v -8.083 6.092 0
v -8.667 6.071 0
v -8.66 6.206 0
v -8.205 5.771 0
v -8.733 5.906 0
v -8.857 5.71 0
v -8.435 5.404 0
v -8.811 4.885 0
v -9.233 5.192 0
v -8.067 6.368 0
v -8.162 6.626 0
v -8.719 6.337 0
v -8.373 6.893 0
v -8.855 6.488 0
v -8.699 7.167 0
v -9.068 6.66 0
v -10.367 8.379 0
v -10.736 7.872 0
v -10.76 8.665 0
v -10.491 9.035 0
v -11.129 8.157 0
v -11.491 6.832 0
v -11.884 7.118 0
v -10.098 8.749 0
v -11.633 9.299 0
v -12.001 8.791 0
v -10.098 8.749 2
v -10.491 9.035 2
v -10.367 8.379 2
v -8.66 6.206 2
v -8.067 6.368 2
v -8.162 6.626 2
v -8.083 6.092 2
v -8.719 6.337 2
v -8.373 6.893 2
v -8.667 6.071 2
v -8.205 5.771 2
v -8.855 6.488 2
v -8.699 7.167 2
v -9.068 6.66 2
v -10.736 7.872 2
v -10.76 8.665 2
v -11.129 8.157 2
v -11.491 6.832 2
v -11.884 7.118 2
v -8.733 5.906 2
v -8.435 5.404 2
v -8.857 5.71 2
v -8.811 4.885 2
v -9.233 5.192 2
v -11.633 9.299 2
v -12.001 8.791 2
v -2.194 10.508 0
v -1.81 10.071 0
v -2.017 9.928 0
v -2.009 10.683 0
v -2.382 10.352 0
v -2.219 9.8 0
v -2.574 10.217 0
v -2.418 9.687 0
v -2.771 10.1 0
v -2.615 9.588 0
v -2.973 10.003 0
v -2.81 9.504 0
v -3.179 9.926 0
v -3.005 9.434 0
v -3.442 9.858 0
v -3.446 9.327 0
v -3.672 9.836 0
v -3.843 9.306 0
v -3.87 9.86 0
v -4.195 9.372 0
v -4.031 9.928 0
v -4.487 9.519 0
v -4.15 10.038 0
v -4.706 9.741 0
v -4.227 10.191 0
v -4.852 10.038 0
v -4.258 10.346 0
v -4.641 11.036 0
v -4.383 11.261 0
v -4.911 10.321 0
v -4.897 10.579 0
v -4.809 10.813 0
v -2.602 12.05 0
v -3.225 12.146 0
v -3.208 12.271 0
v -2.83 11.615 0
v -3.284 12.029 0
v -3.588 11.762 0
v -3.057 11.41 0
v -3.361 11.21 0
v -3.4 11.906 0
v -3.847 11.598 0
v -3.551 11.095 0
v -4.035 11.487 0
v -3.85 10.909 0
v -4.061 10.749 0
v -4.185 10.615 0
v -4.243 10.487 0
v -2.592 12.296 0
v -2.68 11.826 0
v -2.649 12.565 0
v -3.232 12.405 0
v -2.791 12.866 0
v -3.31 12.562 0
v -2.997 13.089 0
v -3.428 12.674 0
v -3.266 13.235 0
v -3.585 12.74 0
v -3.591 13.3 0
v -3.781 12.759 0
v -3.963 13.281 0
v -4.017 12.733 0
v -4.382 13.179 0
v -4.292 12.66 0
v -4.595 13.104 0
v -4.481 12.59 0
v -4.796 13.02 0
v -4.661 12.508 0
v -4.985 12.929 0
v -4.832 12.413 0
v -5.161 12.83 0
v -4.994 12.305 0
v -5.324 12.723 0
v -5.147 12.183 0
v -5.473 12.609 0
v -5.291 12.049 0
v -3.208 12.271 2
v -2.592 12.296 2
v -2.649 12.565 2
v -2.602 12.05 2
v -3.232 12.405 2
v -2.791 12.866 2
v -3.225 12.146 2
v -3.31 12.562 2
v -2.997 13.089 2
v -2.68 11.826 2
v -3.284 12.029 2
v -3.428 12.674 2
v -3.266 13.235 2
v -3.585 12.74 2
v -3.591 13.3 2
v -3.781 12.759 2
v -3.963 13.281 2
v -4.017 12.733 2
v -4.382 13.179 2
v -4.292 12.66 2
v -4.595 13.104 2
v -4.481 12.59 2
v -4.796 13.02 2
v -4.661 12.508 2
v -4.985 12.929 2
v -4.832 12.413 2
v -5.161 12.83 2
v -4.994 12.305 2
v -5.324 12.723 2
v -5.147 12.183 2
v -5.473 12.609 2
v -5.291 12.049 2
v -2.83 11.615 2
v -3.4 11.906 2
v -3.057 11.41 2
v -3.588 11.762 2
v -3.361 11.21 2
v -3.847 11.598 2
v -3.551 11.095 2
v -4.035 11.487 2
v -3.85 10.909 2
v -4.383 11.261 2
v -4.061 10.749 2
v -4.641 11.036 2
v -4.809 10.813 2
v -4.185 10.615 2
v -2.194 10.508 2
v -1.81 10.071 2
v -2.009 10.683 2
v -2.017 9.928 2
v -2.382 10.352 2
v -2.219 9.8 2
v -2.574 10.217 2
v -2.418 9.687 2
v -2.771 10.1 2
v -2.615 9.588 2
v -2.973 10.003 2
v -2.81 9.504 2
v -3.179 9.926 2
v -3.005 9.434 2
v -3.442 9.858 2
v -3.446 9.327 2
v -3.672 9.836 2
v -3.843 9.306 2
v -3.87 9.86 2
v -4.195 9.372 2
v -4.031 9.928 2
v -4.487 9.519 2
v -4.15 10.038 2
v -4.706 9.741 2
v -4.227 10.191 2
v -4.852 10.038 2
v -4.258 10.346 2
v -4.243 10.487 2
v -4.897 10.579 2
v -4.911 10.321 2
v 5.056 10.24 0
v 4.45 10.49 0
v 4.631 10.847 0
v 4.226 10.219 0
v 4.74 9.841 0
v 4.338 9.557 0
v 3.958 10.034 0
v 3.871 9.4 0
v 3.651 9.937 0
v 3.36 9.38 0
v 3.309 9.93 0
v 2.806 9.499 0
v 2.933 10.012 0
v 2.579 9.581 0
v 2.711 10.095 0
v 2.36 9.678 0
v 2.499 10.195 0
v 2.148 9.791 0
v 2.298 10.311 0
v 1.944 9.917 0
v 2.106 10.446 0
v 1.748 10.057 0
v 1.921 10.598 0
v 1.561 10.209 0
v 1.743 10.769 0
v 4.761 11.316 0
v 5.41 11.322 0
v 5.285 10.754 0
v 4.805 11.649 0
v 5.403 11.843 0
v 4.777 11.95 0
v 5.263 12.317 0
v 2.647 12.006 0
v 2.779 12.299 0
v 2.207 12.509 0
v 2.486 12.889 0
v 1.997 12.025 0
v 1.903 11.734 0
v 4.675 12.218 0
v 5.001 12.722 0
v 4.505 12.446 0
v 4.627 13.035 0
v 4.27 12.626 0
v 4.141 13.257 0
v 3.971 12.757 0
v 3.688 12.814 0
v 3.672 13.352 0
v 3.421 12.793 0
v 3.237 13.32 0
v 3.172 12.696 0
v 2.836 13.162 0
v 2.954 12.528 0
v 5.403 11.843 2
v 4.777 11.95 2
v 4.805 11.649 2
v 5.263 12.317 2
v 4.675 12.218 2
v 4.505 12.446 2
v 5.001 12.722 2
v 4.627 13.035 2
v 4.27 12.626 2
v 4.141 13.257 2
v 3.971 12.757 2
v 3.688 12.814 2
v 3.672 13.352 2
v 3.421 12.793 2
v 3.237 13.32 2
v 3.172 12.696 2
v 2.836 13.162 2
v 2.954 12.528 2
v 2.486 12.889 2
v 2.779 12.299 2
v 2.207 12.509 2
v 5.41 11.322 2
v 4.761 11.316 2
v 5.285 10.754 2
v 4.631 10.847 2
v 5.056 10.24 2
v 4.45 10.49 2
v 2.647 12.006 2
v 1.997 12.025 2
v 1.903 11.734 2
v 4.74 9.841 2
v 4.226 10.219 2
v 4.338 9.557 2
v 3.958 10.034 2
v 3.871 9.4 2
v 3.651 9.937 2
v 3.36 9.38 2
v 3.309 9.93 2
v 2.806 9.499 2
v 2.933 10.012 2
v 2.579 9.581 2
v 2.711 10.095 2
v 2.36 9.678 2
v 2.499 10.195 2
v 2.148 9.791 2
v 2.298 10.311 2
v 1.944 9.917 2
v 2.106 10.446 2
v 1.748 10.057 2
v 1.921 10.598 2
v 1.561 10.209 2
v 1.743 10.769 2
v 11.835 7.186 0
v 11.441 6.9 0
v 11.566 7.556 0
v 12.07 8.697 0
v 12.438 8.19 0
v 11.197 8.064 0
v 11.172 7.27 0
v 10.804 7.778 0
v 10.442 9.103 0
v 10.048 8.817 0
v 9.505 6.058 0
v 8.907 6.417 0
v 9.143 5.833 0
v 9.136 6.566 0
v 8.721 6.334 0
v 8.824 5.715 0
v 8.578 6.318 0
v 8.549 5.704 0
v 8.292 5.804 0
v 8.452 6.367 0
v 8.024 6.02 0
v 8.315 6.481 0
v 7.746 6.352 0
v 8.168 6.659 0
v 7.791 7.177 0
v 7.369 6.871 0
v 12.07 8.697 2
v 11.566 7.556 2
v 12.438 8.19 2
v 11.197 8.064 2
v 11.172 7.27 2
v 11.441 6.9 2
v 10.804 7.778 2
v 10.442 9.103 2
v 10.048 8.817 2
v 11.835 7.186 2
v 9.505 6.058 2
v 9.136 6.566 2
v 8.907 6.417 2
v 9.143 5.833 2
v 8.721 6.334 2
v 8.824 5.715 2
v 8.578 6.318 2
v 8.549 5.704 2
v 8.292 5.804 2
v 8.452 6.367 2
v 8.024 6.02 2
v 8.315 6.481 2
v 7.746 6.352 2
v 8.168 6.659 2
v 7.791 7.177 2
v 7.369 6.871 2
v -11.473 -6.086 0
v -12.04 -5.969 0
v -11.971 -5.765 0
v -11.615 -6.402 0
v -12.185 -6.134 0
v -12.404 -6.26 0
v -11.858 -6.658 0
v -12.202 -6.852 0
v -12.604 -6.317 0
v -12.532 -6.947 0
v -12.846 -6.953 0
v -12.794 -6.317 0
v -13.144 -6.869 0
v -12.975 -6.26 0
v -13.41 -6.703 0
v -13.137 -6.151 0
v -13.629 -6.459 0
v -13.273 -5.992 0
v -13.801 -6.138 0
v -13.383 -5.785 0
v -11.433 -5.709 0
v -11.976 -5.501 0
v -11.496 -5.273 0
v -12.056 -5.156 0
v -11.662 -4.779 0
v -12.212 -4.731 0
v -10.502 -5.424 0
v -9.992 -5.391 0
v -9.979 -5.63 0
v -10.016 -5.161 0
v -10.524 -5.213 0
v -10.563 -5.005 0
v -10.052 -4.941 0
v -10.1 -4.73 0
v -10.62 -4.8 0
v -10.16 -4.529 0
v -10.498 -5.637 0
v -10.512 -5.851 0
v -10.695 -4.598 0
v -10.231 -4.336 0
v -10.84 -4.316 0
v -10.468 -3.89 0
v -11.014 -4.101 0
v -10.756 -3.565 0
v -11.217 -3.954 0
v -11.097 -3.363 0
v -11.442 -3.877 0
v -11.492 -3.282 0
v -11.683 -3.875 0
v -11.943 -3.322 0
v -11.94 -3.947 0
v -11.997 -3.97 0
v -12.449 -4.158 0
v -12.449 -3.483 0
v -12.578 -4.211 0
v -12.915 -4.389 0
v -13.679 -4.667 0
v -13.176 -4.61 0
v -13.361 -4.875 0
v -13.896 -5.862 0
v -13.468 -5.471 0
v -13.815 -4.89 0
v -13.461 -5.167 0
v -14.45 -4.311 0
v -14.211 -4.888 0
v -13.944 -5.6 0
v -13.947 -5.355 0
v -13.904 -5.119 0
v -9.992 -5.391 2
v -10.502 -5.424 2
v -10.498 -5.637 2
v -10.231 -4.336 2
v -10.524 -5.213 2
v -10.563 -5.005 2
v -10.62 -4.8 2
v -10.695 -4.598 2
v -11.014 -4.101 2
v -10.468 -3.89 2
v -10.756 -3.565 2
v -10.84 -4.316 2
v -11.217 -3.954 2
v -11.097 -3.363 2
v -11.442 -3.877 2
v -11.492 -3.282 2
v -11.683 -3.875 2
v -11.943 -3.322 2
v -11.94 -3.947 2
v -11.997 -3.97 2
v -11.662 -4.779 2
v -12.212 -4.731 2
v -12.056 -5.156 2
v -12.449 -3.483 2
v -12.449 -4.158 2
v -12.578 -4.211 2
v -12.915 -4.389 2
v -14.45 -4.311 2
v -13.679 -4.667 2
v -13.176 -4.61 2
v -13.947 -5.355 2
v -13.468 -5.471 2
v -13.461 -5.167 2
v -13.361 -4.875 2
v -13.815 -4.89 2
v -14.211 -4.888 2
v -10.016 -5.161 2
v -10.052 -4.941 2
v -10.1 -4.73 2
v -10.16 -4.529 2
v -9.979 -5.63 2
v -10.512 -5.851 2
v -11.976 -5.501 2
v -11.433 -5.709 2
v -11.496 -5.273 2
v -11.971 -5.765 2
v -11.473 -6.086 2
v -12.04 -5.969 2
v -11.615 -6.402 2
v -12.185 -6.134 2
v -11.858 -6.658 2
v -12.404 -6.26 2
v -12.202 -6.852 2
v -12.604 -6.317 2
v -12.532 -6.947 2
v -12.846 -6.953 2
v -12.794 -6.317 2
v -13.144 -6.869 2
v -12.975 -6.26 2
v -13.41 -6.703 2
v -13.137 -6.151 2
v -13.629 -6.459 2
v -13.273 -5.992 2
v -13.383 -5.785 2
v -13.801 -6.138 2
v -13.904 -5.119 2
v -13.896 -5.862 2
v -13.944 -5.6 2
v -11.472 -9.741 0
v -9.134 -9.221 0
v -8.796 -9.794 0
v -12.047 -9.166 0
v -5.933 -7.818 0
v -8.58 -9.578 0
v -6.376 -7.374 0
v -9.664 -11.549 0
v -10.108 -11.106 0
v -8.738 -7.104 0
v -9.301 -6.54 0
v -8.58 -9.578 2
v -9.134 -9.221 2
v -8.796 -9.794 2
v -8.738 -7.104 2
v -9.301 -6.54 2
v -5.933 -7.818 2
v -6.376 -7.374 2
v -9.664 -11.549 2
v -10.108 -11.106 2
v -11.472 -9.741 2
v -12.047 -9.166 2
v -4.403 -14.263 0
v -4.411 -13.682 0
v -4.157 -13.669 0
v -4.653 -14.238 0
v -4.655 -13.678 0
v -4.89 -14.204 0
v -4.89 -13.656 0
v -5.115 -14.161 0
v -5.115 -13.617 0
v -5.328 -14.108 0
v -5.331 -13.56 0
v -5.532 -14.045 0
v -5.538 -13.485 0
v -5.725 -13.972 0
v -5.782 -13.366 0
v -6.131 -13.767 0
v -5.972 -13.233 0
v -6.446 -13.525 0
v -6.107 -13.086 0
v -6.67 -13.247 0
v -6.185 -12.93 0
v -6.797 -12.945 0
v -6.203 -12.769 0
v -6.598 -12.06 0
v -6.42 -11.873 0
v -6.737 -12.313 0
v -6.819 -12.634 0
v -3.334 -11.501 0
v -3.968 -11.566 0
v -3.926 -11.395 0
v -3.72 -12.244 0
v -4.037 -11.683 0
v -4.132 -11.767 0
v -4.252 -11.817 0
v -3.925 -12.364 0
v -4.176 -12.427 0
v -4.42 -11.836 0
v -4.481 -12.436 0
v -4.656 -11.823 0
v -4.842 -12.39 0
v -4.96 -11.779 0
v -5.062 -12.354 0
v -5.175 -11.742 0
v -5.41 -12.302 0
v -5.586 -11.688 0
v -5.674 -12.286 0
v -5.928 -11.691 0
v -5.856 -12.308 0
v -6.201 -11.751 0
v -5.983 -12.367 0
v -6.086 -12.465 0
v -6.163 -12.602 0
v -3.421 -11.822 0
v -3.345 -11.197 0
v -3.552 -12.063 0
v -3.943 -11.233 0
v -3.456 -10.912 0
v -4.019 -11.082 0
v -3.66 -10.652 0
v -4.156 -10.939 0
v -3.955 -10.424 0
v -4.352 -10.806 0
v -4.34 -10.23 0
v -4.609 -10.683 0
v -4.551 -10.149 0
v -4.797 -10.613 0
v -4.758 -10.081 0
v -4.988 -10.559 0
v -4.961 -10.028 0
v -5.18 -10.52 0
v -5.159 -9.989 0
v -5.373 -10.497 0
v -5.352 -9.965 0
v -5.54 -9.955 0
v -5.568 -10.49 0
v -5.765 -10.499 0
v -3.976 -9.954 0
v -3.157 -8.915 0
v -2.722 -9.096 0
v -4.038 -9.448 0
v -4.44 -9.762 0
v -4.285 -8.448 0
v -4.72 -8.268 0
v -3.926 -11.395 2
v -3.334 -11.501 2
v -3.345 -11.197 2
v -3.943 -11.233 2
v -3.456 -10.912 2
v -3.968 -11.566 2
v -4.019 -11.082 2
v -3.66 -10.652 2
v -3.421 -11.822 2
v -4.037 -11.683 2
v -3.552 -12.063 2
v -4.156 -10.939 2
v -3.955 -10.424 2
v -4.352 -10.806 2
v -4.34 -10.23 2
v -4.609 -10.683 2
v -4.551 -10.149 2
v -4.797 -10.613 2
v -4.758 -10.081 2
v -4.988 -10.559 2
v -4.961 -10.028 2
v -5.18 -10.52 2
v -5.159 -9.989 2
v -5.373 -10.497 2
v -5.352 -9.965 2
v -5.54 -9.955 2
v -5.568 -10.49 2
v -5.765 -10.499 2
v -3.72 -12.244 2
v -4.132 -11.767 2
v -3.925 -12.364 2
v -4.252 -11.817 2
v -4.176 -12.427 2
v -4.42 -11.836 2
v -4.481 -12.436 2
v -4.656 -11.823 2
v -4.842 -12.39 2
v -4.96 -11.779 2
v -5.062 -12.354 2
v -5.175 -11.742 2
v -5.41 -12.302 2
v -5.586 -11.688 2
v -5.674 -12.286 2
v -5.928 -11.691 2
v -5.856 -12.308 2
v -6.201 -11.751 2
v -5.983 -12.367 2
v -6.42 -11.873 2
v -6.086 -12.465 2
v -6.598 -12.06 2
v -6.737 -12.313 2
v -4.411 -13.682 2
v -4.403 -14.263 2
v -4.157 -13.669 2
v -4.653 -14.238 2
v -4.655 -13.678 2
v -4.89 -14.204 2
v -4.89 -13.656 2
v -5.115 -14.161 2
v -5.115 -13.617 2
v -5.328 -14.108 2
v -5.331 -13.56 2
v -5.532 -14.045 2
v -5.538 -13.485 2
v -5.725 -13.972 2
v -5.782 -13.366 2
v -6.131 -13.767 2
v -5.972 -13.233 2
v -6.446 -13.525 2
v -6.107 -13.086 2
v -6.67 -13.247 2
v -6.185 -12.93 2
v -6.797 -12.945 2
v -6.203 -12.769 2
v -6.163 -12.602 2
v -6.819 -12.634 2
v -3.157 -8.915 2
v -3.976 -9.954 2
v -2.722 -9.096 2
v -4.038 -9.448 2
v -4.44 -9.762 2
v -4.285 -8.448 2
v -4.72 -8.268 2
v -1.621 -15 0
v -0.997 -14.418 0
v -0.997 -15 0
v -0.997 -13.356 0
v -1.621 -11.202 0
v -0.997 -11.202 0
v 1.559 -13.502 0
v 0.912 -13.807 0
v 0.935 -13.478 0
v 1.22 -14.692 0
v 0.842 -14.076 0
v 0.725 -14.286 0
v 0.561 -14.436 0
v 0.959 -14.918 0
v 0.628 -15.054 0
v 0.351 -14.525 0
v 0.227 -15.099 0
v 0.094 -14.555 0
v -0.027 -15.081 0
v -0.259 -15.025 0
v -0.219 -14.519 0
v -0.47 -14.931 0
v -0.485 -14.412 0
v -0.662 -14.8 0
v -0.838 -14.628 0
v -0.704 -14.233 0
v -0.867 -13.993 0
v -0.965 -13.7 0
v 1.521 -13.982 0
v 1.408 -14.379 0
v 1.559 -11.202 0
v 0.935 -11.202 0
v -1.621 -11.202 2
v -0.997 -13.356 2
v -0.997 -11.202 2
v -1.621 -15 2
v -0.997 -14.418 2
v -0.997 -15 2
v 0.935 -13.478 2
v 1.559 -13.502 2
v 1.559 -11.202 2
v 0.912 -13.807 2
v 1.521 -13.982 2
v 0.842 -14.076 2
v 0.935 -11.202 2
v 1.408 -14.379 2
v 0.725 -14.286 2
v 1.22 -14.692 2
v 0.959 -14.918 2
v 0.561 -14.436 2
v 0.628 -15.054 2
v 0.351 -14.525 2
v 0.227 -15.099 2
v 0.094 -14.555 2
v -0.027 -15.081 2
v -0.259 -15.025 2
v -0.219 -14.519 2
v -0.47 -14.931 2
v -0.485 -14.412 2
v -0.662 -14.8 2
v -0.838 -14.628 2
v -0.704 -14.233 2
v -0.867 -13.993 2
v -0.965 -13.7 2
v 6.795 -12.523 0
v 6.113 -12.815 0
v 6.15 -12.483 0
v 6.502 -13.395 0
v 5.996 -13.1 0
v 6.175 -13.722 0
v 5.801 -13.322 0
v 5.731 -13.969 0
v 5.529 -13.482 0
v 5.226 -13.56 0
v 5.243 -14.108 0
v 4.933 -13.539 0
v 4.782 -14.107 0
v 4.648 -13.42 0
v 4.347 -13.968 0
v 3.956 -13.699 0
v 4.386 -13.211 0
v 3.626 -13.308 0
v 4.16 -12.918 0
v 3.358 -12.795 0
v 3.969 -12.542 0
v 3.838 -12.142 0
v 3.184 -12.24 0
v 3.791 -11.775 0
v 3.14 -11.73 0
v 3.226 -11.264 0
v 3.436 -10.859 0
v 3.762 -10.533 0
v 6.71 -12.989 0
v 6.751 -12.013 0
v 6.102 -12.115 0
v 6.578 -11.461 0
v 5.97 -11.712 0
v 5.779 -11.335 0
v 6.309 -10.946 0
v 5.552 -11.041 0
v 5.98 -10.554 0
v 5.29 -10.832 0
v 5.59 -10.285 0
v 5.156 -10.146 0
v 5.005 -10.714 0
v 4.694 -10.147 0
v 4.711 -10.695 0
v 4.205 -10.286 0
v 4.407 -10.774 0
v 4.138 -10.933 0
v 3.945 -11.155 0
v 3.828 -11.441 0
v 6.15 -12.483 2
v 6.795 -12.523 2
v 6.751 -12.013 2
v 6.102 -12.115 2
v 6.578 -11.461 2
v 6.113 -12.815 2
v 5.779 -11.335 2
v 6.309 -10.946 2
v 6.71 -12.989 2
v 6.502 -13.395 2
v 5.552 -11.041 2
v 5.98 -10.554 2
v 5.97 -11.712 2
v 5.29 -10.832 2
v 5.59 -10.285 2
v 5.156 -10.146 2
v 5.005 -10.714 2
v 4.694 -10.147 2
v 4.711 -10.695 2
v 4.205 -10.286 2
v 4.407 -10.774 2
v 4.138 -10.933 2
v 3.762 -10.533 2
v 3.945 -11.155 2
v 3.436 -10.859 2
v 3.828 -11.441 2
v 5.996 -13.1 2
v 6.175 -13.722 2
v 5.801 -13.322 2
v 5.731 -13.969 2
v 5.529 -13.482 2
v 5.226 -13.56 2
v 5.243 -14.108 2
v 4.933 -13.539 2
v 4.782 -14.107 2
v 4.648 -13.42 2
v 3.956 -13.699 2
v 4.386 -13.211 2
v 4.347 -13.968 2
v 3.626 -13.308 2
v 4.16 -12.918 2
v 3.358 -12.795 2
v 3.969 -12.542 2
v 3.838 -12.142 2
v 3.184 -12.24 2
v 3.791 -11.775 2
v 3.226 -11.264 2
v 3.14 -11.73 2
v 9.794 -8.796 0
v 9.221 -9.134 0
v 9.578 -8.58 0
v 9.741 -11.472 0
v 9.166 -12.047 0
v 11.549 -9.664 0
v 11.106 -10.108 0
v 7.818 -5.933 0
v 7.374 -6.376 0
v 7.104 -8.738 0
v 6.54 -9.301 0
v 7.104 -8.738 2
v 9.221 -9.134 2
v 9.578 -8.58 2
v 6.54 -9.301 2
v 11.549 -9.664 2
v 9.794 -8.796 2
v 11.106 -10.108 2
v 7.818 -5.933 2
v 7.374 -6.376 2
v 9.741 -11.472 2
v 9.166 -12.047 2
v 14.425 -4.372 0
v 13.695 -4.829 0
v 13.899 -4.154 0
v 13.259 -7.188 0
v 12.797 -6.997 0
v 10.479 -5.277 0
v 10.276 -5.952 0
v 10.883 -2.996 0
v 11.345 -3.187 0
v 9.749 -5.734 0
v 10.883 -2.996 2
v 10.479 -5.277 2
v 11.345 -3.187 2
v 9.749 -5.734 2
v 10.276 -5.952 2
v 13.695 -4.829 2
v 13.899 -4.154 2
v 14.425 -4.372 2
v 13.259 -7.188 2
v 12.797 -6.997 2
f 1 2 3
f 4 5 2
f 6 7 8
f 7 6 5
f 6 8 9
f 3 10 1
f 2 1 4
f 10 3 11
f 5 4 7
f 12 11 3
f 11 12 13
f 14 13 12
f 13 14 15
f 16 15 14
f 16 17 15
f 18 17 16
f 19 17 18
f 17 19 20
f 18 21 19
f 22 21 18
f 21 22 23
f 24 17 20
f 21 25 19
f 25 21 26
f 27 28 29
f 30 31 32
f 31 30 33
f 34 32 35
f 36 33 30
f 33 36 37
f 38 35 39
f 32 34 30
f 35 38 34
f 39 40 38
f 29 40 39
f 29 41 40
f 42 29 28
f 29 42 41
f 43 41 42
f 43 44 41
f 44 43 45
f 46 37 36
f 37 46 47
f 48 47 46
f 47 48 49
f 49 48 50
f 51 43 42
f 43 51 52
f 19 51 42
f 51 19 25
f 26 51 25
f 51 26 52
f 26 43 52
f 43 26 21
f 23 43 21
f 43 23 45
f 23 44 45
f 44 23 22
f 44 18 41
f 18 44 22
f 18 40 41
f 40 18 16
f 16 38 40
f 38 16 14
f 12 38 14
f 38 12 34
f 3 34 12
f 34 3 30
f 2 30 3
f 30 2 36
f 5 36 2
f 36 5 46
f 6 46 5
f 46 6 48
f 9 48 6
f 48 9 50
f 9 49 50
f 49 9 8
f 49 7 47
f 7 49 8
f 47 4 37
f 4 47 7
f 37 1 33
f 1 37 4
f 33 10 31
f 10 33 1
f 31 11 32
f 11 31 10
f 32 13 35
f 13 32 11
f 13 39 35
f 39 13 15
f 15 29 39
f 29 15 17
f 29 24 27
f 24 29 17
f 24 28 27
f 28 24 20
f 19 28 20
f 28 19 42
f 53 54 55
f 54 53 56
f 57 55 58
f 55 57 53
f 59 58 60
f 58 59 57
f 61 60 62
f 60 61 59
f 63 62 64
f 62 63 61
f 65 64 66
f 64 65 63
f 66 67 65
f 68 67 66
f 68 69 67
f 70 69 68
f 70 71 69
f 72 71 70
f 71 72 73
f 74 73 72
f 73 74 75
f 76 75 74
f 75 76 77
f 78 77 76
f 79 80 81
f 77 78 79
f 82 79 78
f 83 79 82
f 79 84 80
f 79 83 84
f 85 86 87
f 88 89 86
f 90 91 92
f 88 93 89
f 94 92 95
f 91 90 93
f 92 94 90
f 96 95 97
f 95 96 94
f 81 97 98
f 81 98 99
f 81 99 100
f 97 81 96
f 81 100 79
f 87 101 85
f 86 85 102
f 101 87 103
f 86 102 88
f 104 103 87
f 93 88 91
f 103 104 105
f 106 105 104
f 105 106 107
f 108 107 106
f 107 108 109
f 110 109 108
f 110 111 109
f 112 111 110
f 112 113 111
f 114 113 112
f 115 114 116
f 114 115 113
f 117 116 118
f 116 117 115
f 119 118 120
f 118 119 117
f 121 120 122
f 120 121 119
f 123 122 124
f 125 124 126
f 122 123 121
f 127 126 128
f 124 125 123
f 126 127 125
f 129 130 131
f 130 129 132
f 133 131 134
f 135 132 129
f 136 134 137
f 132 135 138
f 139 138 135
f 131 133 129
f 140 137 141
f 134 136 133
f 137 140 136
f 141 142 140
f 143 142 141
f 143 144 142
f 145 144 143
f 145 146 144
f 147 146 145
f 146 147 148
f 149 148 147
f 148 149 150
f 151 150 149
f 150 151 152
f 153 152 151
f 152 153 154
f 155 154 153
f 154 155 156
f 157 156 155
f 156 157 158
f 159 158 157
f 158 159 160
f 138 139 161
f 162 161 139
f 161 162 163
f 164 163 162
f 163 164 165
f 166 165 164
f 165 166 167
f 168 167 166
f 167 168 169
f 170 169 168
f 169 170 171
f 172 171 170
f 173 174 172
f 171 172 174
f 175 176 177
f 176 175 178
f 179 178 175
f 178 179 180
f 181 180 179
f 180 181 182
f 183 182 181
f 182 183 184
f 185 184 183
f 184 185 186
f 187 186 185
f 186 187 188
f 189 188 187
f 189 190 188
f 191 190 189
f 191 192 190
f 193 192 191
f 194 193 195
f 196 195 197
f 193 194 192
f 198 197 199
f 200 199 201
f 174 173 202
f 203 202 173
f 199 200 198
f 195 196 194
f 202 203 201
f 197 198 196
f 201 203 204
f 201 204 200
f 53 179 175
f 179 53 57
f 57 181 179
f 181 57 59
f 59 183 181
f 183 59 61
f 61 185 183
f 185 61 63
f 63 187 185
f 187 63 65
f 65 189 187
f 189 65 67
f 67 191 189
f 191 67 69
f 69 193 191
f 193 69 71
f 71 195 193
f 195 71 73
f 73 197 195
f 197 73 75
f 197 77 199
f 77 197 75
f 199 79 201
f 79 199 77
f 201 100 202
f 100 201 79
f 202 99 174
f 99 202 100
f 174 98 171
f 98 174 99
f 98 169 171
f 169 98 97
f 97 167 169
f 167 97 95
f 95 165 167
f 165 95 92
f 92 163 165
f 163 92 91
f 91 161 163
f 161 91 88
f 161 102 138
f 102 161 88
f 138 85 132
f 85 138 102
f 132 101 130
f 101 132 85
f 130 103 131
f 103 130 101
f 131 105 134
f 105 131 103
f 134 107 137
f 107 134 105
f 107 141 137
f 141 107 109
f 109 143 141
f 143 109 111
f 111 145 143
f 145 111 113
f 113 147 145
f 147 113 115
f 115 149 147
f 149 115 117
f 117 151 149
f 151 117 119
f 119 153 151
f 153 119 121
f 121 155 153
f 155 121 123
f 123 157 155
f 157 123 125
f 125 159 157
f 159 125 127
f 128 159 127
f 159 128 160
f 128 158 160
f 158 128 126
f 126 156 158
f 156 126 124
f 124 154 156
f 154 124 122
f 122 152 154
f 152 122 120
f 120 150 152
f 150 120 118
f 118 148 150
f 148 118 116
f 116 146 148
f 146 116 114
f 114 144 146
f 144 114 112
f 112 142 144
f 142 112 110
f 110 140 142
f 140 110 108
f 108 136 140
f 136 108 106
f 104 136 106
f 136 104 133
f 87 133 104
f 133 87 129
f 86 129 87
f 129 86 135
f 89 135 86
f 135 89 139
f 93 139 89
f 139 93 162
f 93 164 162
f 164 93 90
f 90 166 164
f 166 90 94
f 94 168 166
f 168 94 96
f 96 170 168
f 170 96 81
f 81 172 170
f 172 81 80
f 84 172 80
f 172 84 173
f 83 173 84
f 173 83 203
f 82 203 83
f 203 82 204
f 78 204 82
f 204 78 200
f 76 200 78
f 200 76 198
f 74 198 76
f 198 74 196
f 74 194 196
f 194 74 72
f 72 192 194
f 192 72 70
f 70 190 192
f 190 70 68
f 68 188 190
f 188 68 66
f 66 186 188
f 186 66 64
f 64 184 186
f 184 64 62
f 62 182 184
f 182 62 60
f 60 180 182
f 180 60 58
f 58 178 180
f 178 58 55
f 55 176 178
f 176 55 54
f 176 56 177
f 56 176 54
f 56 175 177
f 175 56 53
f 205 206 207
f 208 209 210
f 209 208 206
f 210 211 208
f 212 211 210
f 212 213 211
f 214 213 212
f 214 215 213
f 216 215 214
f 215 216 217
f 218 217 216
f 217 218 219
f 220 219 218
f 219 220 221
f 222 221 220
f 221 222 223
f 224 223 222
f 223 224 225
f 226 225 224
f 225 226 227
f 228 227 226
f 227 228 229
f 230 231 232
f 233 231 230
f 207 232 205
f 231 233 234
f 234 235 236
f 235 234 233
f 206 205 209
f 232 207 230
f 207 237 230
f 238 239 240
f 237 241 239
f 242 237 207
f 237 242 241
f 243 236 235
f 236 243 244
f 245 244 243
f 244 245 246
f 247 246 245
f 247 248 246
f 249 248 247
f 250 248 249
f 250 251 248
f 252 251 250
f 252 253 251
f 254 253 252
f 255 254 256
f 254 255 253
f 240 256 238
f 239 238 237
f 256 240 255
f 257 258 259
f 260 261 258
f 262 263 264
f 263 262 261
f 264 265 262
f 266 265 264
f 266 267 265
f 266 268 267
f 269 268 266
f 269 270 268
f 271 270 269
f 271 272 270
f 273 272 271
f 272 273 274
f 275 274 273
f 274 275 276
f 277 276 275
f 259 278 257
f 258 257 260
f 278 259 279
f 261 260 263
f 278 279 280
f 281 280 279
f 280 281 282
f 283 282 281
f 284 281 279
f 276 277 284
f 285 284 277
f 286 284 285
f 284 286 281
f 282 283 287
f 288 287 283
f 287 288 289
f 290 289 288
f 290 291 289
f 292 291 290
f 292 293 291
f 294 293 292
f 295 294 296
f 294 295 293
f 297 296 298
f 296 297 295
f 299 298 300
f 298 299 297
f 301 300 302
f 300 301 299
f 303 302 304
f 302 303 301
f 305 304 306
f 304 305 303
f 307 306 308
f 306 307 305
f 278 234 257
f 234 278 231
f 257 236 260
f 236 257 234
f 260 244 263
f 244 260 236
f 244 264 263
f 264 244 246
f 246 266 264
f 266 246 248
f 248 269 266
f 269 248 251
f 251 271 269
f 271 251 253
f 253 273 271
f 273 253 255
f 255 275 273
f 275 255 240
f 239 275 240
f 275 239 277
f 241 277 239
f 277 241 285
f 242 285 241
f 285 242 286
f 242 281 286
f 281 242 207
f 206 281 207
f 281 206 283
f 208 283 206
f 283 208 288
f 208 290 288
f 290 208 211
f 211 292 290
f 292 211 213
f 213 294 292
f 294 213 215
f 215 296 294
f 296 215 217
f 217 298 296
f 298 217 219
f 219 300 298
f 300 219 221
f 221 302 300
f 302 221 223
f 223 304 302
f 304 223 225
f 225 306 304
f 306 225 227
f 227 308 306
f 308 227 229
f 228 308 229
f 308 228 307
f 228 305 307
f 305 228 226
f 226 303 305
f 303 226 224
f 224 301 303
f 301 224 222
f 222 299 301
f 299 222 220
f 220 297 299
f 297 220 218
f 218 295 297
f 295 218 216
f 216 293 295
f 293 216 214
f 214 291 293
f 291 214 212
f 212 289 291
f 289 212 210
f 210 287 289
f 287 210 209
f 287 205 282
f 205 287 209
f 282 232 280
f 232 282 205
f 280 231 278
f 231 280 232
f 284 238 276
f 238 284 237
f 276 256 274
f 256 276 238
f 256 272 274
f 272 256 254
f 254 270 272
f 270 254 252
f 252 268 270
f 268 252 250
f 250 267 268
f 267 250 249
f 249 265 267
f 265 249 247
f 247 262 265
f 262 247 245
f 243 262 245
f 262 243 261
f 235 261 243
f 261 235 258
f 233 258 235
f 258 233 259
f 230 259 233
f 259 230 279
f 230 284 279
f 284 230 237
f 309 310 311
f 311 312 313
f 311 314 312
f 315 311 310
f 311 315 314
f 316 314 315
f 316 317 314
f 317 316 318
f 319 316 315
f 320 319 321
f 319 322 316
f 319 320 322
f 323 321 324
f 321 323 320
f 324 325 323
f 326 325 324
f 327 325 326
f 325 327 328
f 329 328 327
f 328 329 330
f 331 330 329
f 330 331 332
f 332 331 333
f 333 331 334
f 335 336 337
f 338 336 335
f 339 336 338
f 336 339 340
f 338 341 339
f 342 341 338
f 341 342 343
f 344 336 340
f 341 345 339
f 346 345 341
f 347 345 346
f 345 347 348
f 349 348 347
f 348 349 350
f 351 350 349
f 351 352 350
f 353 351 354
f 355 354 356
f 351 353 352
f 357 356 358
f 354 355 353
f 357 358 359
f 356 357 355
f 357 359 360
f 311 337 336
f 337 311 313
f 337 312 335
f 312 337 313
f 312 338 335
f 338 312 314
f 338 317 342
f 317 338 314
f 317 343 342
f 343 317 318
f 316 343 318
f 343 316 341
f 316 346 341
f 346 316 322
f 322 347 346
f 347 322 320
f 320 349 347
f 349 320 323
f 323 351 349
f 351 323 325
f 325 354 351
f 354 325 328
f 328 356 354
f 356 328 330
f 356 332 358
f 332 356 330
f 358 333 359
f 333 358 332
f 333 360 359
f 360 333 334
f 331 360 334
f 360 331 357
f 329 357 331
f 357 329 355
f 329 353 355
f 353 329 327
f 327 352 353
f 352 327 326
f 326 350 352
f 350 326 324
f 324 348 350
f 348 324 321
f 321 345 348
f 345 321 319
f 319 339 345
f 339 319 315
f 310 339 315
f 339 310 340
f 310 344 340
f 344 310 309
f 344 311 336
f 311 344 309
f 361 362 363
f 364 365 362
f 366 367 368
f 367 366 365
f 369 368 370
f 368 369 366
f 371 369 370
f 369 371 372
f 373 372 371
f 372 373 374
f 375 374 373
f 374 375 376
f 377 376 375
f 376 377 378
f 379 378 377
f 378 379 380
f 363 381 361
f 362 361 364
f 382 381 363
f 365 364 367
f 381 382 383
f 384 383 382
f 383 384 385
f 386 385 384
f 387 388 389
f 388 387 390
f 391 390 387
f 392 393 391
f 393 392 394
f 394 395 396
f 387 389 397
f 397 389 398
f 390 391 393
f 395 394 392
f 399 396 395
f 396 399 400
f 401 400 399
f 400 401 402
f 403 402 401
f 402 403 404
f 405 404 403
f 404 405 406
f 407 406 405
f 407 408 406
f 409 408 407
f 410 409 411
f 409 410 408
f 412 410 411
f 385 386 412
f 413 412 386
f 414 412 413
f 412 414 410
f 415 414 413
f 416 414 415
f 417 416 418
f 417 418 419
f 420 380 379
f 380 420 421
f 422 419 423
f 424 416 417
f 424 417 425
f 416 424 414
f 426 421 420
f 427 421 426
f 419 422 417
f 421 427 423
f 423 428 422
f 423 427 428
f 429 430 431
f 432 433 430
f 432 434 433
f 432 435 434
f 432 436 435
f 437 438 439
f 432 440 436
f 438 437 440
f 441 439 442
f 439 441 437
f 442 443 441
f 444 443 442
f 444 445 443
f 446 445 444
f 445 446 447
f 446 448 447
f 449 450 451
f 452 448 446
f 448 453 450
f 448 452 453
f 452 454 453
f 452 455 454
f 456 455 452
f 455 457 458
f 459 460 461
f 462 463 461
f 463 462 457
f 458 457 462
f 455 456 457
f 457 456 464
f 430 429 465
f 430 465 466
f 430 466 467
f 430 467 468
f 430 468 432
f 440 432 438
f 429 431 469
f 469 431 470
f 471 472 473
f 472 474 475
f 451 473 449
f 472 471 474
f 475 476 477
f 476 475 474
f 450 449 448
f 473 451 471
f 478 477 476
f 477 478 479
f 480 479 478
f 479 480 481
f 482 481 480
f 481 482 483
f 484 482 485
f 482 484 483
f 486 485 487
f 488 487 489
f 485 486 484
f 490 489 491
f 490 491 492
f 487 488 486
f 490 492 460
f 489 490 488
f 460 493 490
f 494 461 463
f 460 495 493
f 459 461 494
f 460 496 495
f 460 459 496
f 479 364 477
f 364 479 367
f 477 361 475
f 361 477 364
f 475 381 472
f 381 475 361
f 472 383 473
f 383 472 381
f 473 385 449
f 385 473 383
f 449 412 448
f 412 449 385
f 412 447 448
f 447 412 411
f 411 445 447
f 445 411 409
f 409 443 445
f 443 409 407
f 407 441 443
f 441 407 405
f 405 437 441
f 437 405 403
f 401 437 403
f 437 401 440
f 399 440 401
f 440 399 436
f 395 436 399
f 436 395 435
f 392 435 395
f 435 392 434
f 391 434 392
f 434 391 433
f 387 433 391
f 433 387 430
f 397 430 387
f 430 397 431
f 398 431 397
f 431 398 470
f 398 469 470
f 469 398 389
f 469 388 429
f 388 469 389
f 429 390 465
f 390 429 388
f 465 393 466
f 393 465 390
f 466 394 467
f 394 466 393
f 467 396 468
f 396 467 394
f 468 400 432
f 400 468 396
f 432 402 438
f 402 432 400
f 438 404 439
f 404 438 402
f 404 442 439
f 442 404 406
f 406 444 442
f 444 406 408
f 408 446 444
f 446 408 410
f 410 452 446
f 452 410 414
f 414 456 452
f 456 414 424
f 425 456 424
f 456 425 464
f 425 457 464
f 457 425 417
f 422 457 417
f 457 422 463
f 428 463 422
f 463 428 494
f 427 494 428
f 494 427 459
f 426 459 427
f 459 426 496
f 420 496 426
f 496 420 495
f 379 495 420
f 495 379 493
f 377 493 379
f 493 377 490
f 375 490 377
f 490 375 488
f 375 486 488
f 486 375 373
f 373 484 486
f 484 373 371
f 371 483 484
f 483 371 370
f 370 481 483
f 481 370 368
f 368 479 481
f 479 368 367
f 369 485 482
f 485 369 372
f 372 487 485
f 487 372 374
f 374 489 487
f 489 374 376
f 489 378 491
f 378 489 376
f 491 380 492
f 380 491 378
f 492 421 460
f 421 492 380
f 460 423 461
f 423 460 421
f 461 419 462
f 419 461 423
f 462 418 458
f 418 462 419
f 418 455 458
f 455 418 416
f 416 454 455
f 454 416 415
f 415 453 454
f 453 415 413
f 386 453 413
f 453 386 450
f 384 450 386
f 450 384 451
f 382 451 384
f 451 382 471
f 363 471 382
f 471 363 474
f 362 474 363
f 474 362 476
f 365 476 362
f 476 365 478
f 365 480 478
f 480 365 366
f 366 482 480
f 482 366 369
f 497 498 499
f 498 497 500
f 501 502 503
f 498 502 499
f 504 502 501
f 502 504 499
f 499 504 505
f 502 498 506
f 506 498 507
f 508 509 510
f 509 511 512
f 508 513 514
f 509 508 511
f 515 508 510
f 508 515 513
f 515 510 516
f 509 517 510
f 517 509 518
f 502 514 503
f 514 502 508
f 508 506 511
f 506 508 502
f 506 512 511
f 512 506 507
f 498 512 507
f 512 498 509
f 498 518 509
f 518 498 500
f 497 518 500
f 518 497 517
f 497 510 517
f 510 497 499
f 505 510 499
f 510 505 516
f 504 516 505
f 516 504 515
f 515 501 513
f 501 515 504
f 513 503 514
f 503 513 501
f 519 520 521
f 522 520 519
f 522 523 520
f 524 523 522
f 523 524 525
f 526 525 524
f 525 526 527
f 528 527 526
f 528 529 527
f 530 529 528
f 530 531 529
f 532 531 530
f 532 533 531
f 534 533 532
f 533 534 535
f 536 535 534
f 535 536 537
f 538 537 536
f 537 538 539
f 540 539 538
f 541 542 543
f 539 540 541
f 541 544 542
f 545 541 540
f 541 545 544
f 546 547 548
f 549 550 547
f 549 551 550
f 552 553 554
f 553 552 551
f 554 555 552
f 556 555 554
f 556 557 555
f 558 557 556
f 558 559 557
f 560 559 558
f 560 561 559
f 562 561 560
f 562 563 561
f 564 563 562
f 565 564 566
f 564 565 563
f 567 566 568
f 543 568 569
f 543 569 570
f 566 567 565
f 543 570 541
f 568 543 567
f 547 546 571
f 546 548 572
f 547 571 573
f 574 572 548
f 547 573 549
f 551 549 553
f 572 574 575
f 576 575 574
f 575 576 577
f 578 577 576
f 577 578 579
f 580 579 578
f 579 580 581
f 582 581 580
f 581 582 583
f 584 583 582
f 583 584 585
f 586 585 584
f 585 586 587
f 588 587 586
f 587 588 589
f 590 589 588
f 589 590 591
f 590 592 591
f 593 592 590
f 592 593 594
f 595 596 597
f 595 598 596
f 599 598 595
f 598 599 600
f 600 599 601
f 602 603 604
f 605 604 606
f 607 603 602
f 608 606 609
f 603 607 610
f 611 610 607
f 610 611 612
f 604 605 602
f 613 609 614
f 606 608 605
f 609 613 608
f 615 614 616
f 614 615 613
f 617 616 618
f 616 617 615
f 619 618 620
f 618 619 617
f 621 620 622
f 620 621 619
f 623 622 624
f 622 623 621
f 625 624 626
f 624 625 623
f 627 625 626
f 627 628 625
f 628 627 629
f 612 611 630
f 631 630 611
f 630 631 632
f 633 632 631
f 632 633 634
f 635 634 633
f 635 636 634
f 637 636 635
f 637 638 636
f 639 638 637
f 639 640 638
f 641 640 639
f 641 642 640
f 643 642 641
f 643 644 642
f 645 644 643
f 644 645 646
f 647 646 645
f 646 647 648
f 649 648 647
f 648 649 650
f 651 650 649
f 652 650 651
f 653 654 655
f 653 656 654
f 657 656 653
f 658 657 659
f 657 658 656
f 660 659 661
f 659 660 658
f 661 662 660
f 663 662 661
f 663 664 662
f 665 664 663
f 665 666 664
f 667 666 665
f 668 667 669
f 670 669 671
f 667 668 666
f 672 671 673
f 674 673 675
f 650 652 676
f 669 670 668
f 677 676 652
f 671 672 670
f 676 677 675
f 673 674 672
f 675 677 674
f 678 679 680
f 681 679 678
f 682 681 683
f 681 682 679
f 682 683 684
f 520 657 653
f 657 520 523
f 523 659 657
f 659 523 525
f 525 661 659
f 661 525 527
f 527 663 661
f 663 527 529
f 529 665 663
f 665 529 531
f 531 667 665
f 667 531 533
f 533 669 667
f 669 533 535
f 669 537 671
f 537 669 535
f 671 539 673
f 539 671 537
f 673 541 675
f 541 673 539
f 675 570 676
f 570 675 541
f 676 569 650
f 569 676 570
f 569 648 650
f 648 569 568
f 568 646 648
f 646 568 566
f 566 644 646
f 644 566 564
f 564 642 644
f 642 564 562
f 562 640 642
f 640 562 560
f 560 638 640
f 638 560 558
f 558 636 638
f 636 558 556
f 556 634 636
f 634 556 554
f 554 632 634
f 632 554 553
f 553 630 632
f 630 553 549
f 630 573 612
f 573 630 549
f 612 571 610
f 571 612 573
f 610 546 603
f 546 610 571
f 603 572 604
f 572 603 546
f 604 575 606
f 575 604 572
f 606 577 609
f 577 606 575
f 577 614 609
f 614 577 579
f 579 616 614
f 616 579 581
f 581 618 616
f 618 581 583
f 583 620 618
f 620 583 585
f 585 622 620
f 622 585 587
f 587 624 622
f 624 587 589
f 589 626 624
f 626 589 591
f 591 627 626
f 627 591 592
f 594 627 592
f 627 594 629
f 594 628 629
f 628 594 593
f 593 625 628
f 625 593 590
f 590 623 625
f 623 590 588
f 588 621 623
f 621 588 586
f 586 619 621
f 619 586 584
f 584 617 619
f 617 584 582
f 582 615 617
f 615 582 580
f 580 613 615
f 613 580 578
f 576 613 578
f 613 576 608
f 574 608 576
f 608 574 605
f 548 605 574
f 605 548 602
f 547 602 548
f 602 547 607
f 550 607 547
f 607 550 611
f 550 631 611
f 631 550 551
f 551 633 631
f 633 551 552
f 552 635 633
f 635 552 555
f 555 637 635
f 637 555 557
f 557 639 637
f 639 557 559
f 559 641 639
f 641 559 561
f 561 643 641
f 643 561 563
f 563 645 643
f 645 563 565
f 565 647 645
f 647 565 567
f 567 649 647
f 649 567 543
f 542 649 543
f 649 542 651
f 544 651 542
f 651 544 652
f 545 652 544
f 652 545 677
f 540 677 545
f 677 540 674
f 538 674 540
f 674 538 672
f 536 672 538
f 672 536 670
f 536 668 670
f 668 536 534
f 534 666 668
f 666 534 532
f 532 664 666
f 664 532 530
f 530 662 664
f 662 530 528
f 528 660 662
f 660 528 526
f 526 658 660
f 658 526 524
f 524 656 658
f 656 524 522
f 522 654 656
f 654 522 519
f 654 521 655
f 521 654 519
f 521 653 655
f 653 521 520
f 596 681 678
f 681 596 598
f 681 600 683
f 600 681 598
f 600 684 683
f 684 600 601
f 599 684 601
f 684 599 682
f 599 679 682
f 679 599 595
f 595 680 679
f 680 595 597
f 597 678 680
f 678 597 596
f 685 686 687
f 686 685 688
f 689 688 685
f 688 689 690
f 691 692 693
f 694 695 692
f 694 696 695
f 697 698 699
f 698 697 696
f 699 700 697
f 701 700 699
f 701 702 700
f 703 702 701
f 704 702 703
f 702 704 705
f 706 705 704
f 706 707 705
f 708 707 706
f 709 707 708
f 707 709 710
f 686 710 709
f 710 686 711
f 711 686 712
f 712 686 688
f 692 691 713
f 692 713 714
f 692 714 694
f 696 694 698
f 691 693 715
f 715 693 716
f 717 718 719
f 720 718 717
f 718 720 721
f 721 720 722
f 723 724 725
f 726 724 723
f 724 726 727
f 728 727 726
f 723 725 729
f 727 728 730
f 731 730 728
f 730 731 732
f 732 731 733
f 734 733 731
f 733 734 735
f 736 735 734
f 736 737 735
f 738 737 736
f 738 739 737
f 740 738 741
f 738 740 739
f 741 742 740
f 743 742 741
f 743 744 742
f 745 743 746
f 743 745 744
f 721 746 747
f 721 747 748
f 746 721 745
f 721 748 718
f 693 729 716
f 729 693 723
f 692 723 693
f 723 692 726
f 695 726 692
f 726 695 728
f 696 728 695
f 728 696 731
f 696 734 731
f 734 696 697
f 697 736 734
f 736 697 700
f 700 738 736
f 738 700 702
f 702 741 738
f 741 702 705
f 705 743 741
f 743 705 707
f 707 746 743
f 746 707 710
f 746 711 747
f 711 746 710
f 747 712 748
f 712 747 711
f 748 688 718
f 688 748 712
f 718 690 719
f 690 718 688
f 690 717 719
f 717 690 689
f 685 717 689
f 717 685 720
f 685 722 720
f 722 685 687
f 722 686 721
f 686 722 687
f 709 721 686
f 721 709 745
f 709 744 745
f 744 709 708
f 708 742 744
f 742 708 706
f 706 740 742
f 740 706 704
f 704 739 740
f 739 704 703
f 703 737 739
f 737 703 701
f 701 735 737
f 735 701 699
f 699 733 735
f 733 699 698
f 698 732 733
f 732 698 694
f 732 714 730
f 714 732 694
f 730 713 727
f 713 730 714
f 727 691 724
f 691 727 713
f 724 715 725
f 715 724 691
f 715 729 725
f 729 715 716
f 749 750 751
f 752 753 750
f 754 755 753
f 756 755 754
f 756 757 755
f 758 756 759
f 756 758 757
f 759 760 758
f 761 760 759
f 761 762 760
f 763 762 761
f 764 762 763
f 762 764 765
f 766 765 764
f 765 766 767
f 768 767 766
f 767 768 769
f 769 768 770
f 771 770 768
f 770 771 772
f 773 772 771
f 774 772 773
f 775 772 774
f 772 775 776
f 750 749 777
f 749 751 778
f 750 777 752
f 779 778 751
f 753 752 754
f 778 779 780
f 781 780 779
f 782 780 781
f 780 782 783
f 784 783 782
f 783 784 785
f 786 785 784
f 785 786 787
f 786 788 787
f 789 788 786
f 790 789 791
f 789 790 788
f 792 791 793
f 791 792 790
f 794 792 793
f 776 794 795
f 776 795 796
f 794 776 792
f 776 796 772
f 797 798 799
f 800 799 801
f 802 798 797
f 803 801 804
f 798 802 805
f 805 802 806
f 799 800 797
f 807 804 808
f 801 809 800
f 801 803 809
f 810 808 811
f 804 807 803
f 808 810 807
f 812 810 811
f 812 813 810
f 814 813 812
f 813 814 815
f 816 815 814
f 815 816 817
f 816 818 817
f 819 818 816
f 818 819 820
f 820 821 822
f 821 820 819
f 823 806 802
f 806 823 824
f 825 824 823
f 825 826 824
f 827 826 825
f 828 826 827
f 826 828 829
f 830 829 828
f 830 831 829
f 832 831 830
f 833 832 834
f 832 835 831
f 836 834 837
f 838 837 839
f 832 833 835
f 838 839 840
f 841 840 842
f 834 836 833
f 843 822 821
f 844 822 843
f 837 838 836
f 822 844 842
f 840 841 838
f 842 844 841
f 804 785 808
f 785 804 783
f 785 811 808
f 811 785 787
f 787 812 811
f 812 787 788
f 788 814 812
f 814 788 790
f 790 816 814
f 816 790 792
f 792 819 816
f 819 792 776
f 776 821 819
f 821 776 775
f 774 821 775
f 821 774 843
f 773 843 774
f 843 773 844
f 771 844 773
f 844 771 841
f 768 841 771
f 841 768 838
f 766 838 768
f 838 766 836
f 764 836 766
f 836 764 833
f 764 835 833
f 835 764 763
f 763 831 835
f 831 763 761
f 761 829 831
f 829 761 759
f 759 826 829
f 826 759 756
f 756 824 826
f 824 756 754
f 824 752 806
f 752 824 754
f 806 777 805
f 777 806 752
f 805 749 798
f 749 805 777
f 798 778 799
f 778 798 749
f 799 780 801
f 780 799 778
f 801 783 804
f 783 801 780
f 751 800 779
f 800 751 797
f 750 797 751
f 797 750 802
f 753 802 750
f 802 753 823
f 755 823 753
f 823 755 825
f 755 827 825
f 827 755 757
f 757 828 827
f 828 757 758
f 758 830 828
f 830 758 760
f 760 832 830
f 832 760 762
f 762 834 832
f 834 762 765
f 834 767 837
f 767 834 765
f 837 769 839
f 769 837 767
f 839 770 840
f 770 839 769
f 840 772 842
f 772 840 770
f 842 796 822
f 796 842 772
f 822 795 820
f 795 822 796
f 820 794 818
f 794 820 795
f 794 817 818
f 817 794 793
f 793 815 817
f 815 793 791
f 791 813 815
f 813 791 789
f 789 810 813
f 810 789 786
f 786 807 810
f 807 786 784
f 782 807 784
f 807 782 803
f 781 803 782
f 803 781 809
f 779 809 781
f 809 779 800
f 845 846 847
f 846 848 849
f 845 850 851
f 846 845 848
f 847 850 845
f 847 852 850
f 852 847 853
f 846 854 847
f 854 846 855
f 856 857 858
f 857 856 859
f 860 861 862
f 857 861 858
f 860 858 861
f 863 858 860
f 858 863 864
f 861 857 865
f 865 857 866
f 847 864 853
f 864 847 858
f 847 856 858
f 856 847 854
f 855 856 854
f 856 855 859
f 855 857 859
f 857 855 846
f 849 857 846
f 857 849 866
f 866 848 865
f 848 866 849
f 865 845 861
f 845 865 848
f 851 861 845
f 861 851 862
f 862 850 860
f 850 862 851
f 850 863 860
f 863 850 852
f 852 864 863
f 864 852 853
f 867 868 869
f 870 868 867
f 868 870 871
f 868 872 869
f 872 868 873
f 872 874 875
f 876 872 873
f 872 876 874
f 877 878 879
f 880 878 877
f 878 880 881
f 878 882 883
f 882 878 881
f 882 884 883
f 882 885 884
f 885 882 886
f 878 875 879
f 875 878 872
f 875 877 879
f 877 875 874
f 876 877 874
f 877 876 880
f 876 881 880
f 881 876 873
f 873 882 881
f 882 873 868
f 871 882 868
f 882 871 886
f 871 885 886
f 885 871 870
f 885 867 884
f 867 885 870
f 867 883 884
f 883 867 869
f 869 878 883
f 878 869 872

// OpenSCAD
module arch_text(text=" test ", r=10, t=2,
                font="Arial Unicode MS:style=Regular",
                size=5, inv=false)
{
    // TODO add vertical alignement handling
    
    // angle incremenet
    d_a = 180/(len(text)-1);
    r_i = inv ? 180 : 0;

    for(i=[0:len(text)])
    {
        idx = inv ? len(text)-i-1 : i;
        c = text[idx];
        r_z = 180-d_a*i;
        linear_extrude(t)
        {
            // rotate on the arch
            rotate([0,0,r_z]) translate([r,0,0])
                // rotate bottom to the center
                rotate([0,r_i,-90])
                    text(text=c,font=font,size=size,
                    halign="center");
        }
        
    }
    
}

arch_text(inv=true);

module inv_arch_text(text=" zkouška ", r=10, t=2,
                font="Arial Unicode MS:style=Regular",
                size=5, inv=false)
{
    // TODO add vertical alignement handling
    
    // angle incremenet
    d_a = 180/(len(text)-1);
    r_i = inv ? 180 : 0;

    for(i=[0:len(text)])
    {
        idx = inv ? len(text)-i-1 : i;
        c = text[idx];
        r_z = d_a*i;
        linear_extrude(t)
        {
            // rotate on the arch
            rotate([0,0,r_z]) translate([-r-size,0,0])
                // rotate bottom to the center
                rotate([0,r_i,-90])
                    text(text=c,font=font,size=size,
                    halign="center");
        }
        
    }
    
}
inv_arch_text(inv=true);
